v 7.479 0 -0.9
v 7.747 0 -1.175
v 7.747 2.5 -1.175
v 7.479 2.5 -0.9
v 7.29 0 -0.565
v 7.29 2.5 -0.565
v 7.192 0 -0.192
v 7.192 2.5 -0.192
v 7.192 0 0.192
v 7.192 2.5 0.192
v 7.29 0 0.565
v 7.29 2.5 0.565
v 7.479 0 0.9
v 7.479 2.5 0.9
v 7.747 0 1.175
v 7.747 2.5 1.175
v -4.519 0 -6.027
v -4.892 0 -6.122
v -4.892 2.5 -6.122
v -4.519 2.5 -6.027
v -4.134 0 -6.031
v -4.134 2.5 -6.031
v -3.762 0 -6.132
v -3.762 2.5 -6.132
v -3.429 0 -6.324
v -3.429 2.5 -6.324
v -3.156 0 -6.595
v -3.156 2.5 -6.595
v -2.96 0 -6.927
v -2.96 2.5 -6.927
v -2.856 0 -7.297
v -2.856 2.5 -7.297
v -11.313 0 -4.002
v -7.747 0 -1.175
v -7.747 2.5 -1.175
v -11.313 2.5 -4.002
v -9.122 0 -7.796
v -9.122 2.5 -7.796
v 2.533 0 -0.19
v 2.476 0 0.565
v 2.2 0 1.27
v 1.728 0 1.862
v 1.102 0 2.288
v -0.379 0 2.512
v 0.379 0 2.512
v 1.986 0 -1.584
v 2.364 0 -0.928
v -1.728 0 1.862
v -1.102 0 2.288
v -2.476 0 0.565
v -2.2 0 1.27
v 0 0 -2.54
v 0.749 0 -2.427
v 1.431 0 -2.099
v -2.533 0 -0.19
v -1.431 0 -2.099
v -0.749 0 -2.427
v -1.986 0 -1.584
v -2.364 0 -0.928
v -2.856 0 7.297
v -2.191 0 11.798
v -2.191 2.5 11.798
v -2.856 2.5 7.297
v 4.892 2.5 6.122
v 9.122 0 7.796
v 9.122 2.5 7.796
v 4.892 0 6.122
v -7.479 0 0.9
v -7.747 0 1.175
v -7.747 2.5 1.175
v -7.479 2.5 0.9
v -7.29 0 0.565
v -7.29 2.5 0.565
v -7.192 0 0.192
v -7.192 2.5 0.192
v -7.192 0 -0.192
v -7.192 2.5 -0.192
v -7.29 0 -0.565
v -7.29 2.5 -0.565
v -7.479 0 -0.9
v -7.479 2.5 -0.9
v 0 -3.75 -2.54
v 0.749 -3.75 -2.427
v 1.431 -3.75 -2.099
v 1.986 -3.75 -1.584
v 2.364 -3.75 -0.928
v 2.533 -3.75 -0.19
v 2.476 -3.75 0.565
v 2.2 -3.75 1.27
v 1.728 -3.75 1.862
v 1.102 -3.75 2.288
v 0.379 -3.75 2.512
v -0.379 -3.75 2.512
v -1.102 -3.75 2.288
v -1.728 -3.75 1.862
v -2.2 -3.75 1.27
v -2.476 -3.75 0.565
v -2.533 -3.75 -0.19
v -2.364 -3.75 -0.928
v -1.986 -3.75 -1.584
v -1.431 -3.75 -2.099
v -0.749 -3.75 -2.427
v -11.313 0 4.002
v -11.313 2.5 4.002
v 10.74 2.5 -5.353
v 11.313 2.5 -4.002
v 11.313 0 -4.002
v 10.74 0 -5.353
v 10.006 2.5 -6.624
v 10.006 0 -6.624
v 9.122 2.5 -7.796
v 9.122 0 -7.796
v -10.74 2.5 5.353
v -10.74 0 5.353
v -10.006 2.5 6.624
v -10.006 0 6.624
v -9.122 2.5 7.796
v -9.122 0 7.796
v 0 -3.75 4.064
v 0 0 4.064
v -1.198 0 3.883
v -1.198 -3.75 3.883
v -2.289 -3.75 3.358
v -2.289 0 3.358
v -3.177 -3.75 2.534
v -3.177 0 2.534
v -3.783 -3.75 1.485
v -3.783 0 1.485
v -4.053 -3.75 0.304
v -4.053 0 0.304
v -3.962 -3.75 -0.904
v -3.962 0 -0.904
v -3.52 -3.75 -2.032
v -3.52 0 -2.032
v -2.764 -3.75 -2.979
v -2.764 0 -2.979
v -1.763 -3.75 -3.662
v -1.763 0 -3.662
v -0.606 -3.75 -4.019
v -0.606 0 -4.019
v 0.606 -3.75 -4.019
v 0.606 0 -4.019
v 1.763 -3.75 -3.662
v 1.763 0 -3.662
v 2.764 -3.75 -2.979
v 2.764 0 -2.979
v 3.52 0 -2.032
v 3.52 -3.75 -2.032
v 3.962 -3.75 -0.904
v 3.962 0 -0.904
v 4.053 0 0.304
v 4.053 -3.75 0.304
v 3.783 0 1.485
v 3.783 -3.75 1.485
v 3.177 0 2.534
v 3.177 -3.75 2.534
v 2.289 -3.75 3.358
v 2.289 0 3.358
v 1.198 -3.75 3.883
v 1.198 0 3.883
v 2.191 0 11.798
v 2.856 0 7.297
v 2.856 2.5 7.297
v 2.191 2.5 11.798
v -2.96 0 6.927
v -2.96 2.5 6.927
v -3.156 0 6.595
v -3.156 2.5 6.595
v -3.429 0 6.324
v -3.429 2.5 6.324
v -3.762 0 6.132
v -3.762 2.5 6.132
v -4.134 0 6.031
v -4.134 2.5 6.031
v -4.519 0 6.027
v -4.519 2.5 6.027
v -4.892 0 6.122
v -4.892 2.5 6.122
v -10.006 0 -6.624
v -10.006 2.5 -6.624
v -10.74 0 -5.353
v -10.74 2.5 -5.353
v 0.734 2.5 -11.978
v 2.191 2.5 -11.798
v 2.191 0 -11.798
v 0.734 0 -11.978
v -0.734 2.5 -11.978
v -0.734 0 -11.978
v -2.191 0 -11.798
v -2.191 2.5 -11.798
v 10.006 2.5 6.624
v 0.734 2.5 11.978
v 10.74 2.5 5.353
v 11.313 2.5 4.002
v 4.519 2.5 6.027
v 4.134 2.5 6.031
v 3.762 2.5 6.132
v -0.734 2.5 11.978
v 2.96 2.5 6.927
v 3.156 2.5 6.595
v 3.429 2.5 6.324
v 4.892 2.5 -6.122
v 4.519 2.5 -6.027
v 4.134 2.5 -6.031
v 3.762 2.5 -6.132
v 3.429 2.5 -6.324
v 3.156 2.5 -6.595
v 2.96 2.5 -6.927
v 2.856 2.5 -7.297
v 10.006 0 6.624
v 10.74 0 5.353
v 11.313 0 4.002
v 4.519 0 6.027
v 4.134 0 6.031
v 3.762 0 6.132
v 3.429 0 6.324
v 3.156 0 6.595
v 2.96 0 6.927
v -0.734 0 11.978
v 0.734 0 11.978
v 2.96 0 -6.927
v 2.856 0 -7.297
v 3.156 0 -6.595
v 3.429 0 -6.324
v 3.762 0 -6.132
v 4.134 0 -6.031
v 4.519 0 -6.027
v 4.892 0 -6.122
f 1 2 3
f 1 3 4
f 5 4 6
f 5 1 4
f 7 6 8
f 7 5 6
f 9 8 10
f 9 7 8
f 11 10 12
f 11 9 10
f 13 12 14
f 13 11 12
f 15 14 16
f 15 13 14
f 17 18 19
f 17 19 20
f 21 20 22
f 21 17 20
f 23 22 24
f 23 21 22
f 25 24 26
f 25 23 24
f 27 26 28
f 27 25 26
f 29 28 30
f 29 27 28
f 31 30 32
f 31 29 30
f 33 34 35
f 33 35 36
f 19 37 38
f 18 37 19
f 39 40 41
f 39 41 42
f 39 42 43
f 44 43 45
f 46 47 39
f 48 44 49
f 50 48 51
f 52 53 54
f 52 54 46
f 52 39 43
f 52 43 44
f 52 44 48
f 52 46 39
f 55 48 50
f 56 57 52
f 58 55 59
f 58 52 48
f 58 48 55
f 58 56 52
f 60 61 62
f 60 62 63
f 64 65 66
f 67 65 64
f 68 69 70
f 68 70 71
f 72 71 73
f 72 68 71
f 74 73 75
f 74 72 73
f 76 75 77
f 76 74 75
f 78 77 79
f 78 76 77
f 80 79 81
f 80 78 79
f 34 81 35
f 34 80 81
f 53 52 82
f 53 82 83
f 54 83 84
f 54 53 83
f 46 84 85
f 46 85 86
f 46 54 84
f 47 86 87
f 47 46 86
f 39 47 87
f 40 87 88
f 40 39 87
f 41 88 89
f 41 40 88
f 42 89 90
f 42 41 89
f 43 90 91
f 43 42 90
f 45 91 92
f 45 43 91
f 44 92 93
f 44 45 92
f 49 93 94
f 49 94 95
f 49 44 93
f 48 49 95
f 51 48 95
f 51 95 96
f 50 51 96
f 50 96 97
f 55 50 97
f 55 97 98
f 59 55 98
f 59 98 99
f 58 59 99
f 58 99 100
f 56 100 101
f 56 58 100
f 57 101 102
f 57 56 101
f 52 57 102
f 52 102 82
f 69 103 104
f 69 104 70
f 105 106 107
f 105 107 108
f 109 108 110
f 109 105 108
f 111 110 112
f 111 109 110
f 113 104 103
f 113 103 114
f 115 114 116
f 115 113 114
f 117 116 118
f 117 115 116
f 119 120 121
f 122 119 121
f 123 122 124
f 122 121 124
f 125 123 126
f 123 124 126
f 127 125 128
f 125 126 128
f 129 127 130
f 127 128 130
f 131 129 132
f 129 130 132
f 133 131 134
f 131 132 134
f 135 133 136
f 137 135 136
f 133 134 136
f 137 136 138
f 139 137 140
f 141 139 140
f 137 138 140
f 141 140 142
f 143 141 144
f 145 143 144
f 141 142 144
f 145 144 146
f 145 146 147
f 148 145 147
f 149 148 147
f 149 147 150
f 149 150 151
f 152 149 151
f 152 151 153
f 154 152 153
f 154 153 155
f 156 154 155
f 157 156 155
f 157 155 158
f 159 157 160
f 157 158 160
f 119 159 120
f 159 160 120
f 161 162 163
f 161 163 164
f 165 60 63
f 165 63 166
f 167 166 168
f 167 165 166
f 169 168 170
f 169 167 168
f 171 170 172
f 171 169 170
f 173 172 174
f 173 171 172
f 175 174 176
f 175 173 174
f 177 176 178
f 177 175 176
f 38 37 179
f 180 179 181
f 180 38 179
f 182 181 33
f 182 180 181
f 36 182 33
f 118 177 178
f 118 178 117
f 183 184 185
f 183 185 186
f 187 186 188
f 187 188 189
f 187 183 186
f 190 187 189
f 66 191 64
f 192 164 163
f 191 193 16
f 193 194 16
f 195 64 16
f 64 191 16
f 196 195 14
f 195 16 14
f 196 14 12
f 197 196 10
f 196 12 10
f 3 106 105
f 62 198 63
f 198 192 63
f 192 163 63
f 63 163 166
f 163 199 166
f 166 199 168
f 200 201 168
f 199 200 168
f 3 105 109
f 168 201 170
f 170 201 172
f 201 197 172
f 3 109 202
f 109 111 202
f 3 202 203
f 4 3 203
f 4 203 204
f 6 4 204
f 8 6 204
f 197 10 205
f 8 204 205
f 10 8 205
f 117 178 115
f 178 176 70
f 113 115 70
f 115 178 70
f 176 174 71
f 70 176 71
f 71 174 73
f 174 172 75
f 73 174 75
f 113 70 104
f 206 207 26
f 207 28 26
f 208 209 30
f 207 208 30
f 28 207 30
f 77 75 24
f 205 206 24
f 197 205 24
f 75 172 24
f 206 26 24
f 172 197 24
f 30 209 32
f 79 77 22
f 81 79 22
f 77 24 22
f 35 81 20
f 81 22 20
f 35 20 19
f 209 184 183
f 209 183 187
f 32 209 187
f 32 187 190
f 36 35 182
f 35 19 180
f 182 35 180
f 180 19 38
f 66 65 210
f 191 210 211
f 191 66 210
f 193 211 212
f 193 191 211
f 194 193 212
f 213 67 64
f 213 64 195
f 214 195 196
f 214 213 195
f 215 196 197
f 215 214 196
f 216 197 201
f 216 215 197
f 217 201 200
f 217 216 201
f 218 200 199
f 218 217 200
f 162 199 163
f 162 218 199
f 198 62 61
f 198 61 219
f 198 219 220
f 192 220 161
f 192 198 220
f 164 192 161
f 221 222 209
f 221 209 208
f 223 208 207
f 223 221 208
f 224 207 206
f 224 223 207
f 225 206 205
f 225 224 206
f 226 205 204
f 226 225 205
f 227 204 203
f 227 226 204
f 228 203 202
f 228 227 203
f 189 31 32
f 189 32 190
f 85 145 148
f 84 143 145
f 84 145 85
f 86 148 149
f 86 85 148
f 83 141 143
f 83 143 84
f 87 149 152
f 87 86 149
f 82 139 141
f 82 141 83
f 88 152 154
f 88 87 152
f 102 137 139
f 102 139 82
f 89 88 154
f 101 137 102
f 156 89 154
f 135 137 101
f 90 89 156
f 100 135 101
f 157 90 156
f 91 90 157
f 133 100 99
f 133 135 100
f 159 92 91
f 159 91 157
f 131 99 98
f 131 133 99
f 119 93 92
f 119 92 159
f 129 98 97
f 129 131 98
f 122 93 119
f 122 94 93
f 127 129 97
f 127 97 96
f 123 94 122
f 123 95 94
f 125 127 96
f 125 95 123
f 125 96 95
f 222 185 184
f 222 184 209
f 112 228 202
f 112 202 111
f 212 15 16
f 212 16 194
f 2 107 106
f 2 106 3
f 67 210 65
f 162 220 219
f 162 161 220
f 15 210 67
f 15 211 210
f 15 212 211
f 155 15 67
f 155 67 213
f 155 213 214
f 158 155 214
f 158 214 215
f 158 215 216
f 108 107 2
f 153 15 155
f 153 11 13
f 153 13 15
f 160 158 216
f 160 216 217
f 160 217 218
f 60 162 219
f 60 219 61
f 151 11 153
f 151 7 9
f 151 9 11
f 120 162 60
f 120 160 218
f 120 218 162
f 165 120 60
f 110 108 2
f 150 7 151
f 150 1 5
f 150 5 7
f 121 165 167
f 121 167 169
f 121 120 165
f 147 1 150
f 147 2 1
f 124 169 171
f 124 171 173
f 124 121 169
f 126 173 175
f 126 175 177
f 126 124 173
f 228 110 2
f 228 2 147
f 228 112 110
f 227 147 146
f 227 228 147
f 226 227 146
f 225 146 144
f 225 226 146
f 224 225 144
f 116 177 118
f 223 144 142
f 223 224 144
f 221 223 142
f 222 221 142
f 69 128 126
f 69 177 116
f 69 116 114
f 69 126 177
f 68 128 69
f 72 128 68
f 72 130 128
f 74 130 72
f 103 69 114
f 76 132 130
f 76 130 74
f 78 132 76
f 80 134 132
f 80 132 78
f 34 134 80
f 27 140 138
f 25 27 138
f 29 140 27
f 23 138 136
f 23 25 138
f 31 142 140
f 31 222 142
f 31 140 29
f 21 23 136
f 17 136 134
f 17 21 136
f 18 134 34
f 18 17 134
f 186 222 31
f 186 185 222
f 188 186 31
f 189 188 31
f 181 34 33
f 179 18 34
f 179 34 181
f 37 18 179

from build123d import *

# Parameters (mm, degrees)
EXTRUDE_1_DEPTH     = 2.5
SKETCH_2_R          = 4.064
SKETCH_2_R_2        = 2.54
EXTRUDE_2_DEPTH     = 3.75
SKETCH_3_R          = 18.887467654
SKETCH_3_R_2        = 12
CUT_EXTRUDE_3_DEPTH = 23.225268927


with BuildPart() as part:
    # Эскиз1 → Вытянуть1 (new body)
    with BuildSketch(Plane(origin=(0, 0, 0), x_dir=(1, 0, 0), z_dir=(0, 1, 0))):
        with BuildLine():
            Line((-1.842046714, -14.157953286), (-2.855725348, -7.29719043))
            ThreePointArc((-2.855725348, -7.29719043), (-3.589616048, -6.217397374), (-4.891689614, -6.121725913))
            Line((-4.891689614, -6.121725913), (-11.340123854, -8.674235892))
            ThreePointArc((-11.340123854, -8.674235892), (-13.856406461, -8), (-13.182170568, -5.483717394))
            Line((-13.182170568, -5.483717394), (-7.747414963, -1.175464517))
            ThreePointArc((-7.747414963, -1.175464517), (-7.179232096, 0), (-7.747414963, 1.175464517))
            Line((-7.747414963, 1.175464517), (-13.182170568, 5.483717394))
            ThreePointArc((-13.182170568, 5.483717394), (-13.856406461, 8), (-11.340123854, 8.674235892))
            Line((-11.340123854, 8.674235892), (-4.891689614, 6.121725913))
            ThreePointArc((-4.891689614, 6.121725913), (-3.589616048, 6.217397374), (-2.855725348, 7.29719043))
            Line((-2.855725348, 7.29719043), (-1.842046714, 14.157953286))
            ThreePointArc((-1.842046714, 14.157953286), (0, 16), (1.842046714, 14.157953286))
            Line((1.842046714, 14.157953286), (2.855725348, 7.29719043))
            ThreePointArc((2.855725348, 7.29719043), (3.589616048, 6.217397374), (4.891689614, 6.121725913))
            Line((4.891689614, 6.121725913), (11.340123854, 8.674235892))
            ThreePointArc((11.340123854, 8.674235892), (13.856406461, 8), (13.182170568, 5.483717394))
            Line((13.182170568, 5.483717394), (7.747414963, 1.175464517))
            ThreePointArc((7.747414963, 1.175464517), (7.179232096, 0), (7.747414963, -1.175464517))
            Line((7.747414963, -1.175464517), (13.182170568, -5.483717394))
            ThreePointArc((13.182170568, -5.483717394), (13.856406461, -8), (11.340123854, -8.674235892))
            Line((11.340123854, -8.674235892), (4.891689614, -6.121725913))
            ThreePointArc((4.891689614, -6.121725913), (3.589616048, -6.217397374), (2.855725348, -7.29719043))
            Line((2.855725348, -7.29719043), (1.842046714, -14.157953286))
            ThreePointArc((1.842046714, -14.157953286), (0, -16), (-1.842046714, -14.157953286))
        make_face()
    extrude(amount=EXTRUDE_1_DEPTH)

    # Эскиз2 → Вытянуть2 (add)
    with BuildSketch(Plane.XZ):
        with Locations(Location((0, 0, 0), (0, 0, 90))):
            Circle(SKETCH_2_R)
        with Locations(Location((0, 0, 0), (0, 0, 270))):
            Circle(SKETCH_2_R_2, mode=Mode.SUBTRACT)
    extrude(amount=EXTRUDE_2_DEPTH)

    # Эскиз3 → Вытянуть3 (cut, through all)
    with BuildSketch(Plane(origin=(0, 2.5, 0), x_dir=(-1, 0, 0), z_dir=(0, 1, 0))):
        Circle(SKETCH_3_R)
        Circle(SKETCH_3_R_2, mode=Mode.SUBTRACT)
    extrude(amount=-CUT_EXTRUDE_3_DEPTH, mode=Mode.SUBTRACT)


solid = part.part
